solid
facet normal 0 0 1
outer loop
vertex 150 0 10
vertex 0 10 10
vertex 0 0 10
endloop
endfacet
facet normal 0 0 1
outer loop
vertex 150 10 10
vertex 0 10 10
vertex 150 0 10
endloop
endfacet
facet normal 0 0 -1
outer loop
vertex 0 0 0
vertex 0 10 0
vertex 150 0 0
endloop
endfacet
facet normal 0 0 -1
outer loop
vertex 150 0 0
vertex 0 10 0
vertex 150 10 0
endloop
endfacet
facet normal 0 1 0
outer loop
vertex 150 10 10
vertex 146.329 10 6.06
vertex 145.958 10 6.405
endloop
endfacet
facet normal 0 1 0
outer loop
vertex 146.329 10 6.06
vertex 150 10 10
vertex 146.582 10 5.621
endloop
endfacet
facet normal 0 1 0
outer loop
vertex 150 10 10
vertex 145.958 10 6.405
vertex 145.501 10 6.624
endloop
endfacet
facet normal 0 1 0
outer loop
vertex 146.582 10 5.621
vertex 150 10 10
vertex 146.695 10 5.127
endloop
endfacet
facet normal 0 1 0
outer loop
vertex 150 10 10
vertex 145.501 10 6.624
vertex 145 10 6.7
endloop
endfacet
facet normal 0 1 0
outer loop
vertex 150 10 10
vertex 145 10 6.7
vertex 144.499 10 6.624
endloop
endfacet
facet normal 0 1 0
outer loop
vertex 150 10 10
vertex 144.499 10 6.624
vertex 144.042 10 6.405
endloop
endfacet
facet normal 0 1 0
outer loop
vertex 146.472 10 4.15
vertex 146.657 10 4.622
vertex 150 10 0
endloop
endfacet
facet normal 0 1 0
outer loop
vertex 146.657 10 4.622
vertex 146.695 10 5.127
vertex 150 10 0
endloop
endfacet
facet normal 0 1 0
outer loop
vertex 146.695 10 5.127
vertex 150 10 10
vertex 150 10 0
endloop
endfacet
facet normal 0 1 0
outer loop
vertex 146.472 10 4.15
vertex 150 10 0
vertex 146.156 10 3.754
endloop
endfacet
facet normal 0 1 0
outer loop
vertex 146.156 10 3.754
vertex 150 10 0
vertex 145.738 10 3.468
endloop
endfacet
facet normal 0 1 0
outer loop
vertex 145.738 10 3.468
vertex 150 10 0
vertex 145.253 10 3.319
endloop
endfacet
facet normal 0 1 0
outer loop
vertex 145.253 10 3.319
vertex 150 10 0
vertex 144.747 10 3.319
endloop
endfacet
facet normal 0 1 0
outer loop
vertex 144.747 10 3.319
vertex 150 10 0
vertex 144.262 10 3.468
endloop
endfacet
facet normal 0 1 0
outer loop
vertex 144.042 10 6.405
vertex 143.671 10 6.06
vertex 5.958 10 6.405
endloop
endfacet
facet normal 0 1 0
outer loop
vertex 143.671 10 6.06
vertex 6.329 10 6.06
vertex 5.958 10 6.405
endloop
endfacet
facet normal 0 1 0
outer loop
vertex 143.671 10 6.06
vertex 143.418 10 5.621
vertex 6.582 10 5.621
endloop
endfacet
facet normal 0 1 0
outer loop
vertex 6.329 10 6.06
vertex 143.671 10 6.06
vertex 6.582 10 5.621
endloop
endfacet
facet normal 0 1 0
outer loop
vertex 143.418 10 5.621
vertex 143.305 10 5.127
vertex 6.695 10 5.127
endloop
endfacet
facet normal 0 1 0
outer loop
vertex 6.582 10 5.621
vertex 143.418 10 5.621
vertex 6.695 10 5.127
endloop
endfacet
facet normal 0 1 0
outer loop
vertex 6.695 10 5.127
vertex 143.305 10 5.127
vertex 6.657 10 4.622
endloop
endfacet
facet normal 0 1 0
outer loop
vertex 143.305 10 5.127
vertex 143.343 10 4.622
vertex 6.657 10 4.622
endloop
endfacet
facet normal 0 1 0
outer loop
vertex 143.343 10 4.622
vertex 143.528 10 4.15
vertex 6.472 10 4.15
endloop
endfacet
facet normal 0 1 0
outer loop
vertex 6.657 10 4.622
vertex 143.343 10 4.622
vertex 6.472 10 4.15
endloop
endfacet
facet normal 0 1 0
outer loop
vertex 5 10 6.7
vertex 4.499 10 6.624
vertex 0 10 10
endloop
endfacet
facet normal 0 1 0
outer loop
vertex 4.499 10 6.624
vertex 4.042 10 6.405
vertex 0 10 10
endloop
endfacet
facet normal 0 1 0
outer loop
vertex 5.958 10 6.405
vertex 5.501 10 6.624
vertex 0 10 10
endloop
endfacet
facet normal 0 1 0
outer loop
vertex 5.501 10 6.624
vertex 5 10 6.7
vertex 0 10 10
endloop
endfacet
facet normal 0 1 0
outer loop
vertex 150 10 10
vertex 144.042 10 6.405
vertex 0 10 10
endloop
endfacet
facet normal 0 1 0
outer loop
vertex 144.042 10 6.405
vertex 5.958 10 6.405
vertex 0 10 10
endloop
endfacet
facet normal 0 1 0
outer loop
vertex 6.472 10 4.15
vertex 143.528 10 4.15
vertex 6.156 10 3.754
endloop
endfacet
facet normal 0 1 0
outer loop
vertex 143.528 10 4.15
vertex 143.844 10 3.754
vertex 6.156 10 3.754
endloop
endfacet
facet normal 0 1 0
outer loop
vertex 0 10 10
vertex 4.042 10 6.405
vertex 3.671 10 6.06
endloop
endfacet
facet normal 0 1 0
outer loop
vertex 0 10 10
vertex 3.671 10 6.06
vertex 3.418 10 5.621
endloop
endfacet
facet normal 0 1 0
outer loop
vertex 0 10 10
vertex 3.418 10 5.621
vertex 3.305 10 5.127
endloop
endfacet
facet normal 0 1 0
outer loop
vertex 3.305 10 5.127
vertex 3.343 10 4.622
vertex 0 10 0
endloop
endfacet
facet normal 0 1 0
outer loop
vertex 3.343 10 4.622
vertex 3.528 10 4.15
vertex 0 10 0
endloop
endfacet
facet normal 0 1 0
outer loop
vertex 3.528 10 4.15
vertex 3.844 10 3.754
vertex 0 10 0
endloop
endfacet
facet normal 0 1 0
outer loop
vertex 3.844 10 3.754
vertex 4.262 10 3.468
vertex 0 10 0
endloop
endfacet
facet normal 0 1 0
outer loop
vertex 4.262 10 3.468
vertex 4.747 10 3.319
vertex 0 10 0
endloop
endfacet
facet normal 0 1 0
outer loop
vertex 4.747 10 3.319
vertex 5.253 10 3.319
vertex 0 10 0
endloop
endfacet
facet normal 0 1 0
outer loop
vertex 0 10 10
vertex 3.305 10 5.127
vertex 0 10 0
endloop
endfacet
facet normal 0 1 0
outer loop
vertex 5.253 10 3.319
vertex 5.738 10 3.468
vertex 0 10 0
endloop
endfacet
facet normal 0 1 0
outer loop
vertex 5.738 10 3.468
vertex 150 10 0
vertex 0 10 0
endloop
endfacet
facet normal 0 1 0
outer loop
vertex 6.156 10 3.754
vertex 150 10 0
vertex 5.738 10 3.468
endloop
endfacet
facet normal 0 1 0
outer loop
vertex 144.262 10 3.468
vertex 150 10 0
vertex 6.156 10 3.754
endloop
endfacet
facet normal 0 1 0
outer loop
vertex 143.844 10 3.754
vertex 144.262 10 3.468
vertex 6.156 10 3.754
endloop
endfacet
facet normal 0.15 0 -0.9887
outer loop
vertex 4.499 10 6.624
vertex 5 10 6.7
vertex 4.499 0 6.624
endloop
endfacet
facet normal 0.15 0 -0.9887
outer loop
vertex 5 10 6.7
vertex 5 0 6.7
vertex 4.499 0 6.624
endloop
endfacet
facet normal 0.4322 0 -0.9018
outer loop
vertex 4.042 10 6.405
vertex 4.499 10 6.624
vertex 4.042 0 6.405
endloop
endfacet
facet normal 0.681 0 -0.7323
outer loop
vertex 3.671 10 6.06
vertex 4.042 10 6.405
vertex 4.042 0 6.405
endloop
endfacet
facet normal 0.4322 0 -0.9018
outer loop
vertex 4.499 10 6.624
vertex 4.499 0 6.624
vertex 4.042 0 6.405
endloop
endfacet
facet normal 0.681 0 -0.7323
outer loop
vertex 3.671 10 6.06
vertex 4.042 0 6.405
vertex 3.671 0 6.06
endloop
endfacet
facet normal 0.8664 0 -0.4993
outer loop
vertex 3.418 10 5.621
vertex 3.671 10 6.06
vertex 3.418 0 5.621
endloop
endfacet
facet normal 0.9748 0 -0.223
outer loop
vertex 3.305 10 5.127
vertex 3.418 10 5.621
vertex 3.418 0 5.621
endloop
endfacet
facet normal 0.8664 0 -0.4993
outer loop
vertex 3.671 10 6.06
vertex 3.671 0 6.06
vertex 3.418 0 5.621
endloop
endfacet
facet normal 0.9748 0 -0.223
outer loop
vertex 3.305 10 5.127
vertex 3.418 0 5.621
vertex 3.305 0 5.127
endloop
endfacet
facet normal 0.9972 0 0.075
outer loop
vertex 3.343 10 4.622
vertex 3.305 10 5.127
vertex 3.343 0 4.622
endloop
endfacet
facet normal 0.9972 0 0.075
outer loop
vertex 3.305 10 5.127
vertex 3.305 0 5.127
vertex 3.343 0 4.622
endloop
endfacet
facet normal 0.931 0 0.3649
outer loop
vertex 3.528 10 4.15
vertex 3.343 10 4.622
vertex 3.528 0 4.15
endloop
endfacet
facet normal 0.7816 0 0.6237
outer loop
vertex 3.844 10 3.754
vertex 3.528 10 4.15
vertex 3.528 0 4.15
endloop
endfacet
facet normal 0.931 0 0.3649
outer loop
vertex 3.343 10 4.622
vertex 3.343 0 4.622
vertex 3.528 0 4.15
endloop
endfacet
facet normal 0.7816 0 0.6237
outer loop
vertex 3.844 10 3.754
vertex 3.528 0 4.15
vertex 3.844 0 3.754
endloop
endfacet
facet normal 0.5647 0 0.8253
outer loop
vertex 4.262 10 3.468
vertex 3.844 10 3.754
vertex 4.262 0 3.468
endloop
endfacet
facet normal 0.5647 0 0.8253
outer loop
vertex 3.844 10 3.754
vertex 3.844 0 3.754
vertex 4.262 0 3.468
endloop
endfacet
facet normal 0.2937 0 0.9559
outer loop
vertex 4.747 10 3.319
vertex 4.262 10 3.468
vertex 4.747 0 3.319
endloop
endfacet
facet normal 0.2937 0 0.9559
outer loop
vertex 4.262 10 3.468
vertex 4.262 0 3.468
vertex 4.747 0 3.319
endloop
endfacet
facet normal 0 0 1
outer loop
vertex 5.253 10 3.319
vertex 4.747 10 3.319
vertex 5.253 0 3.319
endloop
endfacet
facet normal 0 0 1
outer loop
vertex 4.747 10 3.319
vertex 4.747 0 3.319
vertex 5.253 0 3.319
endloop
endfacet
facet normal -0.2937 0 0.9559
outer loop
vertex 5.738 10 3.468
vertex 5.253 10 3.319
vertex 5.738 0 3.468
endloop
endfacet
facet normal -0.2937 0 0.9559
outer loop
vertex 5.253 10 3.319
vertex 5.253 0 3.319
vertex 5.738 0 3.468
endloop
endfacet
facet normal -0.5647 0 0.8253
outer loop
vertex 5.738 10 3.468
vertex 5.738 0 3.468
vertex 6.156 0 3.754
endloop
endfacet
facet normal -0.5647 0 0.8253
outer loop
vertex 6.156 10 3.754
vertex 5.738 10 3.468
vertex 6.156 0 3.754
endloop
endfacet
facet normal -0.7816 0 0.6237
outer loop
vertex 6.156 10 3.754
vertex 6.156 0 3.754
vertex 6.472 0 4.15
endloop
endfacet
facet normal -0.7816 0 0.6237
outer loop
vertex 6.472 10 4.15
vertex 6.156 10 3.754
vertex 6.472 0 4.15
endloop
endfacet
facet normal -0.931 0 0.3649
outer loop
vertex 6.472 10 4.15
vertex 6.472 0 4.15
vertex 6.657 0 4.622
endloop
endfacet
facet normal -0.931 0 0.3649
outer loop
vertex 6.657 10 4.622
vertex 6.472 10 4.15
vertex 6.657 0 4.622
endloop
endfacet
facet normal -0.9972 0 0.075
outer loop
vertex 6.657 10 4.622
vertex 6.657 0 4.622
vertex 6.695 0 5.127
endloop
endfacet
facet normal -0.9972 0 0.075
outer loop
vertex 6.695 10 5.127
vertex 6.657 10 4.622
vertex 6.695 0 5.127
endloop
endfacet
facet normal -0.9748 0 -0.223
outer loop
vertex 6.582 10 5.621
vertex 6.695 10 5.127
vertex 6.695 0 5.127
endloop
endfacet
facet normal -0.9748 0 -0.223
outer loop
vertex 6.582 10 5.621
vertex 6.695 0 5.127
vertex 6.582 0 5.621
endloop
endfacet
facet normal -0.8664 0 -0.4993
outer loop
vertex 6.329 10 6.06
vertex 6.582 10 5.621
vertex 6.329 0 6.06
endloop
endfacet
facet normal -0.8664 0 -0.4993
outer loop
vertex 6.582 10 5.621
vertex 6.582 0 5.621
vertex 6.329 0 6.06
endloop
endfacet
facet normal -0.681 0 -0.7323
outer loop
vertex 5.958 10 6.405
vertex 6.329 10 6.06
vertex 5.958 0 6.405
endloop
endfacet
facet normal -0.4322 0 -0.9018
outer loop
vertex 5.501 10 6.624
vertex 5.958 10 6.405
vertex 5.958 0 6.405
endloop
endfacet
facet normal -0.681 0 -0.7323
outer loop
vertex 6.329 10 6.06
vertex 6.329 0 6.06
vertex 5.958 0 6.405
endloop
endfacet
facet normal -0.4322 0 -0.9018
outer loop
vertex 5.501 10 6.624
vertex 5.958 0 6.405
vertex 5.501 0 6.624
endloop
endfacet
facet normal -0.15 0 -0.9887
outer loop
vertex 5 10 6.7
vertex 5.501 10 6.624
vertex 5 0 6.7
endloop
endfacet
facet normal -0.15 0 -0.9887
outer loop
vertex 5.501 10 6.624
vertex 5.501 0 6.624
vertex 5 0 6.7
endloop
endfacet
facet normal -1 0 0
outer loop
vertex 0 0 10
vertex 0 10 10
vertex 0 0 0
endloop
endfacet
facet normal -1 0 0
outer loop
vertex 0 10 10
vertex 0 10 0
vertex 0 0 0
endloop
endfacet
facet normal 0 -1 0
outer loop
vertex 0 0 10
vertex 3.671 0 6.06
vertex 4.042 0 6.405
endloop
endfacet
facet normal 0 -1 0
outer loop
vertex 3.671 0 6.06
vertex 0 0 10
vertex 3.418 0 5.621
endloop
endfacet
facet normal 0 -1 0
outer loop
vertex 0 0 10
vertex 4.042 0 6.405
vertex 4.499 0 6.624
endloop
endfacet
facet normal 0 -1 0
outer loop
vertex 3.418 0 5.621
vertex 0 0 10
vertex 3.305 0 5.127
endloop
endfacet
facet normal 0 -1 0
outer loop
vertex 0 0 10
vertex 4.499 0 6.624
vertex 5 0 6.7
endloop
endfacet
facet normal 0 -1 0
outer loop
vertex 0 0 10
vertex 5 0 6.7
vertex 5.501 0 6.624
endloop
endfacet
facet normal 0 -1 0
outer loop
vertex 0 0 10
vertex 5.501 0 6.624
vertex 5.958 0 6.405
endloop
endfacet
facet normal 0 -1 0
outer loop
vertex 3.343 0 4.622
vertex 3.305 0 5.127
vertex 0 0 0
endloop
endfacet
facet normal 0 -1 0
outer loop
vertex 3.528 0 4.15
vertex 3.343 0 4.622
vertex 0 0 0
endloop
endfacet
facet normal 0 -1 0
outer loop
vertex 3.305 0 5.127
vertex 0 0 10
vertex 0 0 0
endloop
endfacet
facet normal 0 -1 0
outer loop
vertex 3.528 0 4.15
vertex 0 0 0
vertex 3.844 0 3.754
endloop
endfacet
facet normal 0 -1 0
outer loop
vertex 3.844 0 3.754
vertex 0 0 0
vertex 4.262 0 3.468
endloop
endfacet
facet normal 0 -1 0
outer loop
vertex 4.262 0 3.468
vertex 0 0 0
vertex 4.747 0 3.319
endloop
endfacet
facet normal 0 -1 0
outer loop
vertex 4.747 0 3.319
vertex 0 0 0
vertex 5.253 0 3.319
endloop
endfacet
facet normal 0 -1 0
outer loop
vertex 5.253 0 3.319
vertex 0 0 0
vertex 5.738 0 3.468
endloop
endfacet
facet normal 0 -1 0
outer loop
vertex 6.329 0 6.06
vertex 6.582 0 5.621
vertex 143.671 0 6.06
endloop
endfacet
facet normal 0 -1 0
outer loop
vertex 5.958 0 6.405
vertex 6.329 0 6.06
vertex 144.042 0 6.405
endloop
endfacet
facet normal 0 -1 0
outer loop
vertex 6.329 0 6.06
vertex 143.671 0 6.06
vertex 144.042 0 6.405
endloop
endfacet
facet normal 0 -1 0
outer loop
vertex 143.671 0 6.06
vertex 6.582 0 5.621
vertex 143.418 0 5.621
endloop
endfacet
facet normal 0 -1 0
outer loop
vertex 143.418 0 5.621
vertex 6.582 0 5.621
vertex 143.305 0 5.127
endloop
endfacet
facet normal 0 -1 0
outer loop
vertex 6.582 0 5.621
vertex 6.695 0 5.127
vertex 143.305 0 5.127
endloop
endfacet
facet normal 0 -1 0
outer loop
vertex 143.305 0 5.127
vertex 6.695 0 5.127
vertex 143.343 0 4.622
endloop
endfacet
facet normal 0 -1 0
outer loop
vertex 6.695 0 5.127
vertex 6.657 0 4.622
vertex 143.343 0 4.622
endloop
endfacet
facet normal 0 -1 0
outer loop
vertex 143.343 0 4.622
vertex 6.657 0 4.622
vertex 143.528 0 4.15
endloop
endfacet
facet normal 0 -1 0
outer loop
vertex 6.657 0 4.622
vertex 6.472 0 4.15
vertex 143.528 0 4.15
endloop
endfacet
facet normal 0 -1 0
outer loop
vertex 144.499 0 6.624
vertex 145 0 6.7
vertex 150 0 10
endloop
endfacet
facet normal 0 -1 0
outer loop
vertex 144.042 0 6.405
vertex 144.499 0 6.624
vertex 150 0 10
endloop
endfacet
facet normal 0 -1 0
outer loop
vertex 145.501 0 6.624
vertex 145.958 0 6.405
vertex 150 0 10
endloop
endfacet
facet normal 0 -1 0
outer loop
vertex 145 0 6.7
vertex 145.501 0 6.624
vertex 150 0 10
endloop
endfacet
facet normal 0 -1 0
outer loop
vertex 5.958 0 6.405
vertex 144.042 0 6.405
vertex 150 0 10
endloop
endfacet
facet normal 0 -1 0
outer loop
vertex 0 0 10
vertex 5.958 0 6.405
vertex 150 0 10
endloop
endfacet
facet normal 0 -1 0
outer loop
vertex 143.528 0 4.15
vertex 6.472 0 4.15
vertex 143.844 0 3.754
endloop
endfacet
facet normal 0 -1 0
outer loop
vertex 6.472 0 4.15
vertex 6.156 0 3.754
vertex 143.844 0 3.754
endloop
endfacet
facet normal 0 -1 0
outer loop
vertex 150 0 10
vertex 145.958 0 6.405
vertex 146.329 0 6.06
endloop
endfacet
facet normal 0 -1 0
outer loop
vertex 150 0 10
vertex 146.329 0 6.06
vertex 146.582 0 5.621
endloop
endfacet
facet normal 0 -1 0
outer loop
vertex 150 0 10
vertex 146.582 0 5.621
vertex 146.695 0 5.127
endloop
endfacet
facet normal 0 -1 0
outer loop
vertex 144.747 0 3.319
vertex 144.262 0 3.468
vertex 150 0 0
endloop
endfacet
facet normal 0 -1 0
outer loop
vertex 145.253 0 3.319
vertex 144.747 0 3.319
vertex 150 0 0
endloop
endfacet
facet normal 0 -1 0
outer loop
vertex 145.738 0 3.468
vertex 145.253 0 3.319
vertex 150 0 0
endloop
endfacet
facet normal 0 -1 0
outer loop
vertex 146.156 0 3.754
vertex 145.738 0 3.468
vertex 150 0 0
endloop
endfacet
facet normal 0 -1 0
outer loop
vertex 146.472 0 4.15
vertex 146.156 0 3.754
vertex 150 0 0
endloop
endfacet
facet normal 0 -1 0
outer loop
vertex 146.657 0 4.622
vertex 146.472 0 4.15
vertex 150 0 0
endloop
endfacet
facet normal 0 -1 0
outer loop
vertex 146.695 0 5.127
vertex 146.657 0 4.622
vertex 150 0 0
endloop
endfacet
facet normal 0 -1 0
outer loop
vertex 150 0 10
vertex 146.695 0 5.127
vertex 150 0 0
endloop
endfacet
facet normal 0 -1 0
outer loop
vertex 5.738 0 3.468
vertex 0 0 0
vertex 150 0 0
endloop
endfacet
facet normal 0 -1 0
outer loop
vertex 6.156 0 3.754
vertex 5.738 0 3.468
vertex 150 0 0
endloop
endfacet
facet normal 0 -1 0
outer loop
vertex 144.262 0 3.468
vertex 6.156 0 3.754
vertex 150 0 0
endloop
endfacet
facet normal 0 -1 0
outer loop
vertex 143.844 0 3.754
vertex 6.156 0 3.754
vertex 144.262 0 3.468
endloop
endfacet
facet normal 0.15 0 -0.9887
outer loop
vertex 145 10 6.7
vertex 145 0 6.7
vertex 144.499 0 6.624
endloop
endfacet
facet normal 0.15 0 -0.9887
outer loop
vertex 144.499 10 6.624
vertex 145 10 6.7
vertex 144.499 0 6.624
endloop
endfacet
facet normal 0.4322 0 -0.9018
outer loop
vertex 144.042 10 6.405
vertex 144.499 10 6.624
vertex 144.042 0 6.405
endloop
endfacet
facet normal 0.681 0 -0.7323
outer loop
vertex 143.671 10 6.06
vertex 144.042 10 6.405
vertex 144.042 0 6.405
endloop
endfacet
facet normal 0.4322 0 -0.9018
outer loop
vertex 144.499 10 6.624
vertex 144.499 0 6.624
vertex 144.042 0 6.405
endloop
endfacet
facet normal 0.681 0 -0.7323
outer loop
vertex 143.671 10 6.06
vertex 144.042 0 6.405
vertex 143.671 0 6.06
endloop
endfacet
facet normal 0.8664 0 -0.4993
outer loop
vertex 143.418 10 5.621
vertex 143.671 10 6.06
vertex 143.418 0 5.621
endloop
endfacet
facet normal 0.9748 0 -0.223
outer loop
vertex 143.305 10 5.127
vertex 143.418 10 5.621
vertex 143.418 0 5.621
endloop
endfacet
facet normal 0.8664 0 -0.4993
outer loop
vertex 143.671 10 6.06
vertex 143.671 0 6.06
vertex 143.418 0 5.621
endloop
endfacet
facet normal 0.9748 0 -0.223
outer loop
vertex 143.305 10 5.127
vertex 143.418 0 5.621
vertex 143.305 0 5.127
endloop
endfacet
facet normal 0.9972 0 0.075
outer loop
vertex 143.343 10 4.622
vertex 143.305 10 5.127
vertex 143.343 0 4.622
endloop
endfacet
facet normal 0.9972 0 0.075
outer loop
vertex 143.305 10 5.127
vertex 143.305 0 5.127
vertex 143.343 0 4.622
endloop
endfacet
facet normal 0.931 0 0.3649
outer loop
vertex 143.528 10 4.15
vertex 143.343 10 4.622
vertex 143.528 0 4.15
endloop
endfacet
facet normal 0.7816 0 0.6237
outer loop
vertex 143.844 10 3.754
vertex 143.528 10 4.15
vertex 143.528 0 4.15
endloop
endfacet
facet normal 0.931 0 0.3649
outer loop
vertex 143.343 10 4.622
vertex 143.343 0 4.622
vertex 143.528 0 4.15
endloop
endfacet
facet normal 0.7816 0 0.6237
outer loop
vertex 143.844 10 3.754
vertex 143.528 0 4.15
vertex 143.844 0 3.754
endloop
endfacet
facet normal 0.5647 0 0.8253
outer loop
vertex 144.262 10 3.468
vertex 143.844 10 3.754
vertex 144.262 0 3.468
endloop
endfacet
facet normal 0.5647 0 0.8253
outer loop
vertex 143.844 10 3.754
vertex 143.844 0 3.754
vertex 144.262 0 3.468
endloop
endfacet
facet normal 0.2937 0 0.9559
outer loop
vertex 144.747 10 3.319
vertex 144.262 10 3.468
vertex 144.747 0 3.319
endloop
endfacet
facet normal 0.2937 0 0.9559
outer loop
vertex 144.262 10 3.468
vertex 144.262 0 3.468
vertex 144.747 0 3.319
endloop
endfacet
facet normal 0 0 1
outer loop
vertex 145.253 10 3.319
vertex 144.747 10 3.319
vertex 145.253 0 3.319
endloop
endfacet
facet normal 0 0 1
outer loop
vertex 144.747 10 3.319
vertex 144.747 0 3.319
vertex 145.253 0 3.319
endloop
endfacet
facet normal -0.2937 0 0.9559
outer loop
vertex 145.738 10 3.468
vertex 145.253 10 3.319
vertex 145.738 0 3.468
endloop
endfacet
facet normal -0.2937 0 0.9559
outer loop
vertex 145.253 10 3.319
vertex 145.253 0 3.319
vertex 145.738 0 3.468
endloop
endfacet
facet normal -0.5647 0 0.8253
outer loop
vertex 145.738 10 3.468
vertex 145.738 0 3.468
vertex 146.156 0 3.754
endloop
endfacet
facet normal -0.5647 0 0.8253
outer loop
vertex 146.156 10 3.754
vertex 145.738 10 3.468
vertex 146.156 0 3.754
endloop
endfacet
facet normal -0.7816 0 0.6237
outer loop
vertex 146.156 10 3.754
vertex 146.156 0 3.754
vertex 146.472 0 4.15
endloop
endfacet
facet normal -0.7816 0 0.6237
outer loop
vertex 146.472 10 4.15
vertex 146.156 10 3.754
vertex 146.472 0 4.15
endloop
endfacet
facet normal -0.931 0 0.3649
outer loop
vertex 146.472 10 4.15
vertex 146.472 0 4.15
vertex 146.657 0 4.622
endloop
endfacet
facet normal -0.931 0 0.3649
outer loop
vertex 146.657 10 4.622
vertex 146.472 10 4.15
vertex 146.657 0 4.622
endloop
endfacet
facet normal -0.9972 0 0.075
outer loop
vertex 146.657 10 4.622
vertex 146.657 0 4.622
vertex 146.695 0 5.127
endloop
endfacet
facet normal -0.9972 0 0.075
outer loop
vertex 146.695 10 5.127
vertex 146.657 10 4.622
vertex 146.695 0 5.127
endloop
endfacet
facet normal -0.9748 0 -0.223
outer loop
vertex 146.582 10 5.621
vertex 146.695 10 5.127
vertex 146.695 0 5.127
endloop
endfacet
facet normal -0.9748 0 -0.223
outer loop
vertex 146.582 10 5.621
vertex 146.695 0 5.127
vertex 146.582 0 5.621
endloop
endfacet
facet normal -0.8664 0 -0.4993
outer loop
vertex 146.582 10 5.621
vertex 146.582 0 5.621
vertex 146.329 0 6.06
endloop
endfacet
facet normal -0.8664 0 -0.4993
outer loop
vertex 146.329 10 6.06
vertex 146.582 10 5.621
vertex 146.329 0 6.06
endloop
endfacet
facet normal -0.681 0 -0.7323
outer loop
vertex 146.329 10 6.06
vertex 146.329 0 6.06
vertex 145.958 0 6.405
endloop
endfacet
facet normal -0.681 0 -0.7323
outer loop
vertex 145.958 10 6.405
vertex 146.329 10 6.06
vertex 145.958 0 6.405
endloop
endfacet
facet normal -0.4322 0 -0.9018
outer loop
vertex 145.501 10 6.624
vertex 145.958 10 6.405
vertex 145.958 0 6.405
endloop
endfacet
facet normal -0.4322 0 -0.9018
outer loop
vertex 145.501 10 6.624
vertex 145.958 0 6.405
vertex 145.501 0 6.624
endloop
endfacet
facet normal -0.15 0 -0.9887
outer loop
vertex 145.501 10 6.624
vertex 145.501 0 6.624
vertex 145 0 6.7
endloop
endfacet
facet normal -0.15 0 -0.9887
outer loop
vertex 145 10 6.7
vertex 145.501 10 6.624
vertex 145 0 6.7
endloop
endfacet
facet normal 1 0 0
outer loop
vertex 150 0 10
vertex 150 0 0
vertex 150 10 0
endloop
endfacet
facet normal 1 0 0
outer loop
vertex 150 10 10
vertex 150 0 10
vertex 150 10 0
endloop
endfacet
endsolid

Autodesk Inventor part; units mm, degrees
ref_plane "YZ Plane" through (0, 0, 0) normal (1, 0, 0) x (0, 1, 0)
ref_plane "XZ Plane" through (0, 0, 0) normal (0, 1, 0) x (-1, 0, 0)
ref_plane "XY Plane" through (0, 0, 0) normal (0, 0, 1) x (1, 0, 0)
sketch "スケッチ1" plane through (0, 0, 0) normal (0, 0, 1) x (1, 0, 0)
  line L0 (0, 0) -> (150, 0)
  line L1 (150, 0) -> (150, 10)
  line L2 (150, 10) -> (0, 10)
  line L3 (0, 10) -> (0, 0)
  dimension "d0" = 10
  dimension "d1" = 150
extrude "押し出し1" add sketch "スケッチ1" along normal blind 10
sketch "スケッチ2" plane through (0, 10, 0) normal (0, 1, 0) x (1, 0, 0)
  line L0 (150, 0) -> (0, 0) projected
  line L1 (0, 0) -> (0, -10) projected
  line L2 (75, 0) -> (75, -10)
  line L3 (150, -10) -> (0, -10) projected
  point P0 (5, -5)
  point P1 (145, -5)
  dimension "d4" = 5
  dimension "d5" = 5
hole "穴1" at (5, 10, 5) at (145, 10, 5) direction (0, -1, 0) diameter 3.4 end through all clearance for "Countersunk Flat Head Screw ISO 2009/7046" size "M3" standard "ISO"
properties part number "レール"
